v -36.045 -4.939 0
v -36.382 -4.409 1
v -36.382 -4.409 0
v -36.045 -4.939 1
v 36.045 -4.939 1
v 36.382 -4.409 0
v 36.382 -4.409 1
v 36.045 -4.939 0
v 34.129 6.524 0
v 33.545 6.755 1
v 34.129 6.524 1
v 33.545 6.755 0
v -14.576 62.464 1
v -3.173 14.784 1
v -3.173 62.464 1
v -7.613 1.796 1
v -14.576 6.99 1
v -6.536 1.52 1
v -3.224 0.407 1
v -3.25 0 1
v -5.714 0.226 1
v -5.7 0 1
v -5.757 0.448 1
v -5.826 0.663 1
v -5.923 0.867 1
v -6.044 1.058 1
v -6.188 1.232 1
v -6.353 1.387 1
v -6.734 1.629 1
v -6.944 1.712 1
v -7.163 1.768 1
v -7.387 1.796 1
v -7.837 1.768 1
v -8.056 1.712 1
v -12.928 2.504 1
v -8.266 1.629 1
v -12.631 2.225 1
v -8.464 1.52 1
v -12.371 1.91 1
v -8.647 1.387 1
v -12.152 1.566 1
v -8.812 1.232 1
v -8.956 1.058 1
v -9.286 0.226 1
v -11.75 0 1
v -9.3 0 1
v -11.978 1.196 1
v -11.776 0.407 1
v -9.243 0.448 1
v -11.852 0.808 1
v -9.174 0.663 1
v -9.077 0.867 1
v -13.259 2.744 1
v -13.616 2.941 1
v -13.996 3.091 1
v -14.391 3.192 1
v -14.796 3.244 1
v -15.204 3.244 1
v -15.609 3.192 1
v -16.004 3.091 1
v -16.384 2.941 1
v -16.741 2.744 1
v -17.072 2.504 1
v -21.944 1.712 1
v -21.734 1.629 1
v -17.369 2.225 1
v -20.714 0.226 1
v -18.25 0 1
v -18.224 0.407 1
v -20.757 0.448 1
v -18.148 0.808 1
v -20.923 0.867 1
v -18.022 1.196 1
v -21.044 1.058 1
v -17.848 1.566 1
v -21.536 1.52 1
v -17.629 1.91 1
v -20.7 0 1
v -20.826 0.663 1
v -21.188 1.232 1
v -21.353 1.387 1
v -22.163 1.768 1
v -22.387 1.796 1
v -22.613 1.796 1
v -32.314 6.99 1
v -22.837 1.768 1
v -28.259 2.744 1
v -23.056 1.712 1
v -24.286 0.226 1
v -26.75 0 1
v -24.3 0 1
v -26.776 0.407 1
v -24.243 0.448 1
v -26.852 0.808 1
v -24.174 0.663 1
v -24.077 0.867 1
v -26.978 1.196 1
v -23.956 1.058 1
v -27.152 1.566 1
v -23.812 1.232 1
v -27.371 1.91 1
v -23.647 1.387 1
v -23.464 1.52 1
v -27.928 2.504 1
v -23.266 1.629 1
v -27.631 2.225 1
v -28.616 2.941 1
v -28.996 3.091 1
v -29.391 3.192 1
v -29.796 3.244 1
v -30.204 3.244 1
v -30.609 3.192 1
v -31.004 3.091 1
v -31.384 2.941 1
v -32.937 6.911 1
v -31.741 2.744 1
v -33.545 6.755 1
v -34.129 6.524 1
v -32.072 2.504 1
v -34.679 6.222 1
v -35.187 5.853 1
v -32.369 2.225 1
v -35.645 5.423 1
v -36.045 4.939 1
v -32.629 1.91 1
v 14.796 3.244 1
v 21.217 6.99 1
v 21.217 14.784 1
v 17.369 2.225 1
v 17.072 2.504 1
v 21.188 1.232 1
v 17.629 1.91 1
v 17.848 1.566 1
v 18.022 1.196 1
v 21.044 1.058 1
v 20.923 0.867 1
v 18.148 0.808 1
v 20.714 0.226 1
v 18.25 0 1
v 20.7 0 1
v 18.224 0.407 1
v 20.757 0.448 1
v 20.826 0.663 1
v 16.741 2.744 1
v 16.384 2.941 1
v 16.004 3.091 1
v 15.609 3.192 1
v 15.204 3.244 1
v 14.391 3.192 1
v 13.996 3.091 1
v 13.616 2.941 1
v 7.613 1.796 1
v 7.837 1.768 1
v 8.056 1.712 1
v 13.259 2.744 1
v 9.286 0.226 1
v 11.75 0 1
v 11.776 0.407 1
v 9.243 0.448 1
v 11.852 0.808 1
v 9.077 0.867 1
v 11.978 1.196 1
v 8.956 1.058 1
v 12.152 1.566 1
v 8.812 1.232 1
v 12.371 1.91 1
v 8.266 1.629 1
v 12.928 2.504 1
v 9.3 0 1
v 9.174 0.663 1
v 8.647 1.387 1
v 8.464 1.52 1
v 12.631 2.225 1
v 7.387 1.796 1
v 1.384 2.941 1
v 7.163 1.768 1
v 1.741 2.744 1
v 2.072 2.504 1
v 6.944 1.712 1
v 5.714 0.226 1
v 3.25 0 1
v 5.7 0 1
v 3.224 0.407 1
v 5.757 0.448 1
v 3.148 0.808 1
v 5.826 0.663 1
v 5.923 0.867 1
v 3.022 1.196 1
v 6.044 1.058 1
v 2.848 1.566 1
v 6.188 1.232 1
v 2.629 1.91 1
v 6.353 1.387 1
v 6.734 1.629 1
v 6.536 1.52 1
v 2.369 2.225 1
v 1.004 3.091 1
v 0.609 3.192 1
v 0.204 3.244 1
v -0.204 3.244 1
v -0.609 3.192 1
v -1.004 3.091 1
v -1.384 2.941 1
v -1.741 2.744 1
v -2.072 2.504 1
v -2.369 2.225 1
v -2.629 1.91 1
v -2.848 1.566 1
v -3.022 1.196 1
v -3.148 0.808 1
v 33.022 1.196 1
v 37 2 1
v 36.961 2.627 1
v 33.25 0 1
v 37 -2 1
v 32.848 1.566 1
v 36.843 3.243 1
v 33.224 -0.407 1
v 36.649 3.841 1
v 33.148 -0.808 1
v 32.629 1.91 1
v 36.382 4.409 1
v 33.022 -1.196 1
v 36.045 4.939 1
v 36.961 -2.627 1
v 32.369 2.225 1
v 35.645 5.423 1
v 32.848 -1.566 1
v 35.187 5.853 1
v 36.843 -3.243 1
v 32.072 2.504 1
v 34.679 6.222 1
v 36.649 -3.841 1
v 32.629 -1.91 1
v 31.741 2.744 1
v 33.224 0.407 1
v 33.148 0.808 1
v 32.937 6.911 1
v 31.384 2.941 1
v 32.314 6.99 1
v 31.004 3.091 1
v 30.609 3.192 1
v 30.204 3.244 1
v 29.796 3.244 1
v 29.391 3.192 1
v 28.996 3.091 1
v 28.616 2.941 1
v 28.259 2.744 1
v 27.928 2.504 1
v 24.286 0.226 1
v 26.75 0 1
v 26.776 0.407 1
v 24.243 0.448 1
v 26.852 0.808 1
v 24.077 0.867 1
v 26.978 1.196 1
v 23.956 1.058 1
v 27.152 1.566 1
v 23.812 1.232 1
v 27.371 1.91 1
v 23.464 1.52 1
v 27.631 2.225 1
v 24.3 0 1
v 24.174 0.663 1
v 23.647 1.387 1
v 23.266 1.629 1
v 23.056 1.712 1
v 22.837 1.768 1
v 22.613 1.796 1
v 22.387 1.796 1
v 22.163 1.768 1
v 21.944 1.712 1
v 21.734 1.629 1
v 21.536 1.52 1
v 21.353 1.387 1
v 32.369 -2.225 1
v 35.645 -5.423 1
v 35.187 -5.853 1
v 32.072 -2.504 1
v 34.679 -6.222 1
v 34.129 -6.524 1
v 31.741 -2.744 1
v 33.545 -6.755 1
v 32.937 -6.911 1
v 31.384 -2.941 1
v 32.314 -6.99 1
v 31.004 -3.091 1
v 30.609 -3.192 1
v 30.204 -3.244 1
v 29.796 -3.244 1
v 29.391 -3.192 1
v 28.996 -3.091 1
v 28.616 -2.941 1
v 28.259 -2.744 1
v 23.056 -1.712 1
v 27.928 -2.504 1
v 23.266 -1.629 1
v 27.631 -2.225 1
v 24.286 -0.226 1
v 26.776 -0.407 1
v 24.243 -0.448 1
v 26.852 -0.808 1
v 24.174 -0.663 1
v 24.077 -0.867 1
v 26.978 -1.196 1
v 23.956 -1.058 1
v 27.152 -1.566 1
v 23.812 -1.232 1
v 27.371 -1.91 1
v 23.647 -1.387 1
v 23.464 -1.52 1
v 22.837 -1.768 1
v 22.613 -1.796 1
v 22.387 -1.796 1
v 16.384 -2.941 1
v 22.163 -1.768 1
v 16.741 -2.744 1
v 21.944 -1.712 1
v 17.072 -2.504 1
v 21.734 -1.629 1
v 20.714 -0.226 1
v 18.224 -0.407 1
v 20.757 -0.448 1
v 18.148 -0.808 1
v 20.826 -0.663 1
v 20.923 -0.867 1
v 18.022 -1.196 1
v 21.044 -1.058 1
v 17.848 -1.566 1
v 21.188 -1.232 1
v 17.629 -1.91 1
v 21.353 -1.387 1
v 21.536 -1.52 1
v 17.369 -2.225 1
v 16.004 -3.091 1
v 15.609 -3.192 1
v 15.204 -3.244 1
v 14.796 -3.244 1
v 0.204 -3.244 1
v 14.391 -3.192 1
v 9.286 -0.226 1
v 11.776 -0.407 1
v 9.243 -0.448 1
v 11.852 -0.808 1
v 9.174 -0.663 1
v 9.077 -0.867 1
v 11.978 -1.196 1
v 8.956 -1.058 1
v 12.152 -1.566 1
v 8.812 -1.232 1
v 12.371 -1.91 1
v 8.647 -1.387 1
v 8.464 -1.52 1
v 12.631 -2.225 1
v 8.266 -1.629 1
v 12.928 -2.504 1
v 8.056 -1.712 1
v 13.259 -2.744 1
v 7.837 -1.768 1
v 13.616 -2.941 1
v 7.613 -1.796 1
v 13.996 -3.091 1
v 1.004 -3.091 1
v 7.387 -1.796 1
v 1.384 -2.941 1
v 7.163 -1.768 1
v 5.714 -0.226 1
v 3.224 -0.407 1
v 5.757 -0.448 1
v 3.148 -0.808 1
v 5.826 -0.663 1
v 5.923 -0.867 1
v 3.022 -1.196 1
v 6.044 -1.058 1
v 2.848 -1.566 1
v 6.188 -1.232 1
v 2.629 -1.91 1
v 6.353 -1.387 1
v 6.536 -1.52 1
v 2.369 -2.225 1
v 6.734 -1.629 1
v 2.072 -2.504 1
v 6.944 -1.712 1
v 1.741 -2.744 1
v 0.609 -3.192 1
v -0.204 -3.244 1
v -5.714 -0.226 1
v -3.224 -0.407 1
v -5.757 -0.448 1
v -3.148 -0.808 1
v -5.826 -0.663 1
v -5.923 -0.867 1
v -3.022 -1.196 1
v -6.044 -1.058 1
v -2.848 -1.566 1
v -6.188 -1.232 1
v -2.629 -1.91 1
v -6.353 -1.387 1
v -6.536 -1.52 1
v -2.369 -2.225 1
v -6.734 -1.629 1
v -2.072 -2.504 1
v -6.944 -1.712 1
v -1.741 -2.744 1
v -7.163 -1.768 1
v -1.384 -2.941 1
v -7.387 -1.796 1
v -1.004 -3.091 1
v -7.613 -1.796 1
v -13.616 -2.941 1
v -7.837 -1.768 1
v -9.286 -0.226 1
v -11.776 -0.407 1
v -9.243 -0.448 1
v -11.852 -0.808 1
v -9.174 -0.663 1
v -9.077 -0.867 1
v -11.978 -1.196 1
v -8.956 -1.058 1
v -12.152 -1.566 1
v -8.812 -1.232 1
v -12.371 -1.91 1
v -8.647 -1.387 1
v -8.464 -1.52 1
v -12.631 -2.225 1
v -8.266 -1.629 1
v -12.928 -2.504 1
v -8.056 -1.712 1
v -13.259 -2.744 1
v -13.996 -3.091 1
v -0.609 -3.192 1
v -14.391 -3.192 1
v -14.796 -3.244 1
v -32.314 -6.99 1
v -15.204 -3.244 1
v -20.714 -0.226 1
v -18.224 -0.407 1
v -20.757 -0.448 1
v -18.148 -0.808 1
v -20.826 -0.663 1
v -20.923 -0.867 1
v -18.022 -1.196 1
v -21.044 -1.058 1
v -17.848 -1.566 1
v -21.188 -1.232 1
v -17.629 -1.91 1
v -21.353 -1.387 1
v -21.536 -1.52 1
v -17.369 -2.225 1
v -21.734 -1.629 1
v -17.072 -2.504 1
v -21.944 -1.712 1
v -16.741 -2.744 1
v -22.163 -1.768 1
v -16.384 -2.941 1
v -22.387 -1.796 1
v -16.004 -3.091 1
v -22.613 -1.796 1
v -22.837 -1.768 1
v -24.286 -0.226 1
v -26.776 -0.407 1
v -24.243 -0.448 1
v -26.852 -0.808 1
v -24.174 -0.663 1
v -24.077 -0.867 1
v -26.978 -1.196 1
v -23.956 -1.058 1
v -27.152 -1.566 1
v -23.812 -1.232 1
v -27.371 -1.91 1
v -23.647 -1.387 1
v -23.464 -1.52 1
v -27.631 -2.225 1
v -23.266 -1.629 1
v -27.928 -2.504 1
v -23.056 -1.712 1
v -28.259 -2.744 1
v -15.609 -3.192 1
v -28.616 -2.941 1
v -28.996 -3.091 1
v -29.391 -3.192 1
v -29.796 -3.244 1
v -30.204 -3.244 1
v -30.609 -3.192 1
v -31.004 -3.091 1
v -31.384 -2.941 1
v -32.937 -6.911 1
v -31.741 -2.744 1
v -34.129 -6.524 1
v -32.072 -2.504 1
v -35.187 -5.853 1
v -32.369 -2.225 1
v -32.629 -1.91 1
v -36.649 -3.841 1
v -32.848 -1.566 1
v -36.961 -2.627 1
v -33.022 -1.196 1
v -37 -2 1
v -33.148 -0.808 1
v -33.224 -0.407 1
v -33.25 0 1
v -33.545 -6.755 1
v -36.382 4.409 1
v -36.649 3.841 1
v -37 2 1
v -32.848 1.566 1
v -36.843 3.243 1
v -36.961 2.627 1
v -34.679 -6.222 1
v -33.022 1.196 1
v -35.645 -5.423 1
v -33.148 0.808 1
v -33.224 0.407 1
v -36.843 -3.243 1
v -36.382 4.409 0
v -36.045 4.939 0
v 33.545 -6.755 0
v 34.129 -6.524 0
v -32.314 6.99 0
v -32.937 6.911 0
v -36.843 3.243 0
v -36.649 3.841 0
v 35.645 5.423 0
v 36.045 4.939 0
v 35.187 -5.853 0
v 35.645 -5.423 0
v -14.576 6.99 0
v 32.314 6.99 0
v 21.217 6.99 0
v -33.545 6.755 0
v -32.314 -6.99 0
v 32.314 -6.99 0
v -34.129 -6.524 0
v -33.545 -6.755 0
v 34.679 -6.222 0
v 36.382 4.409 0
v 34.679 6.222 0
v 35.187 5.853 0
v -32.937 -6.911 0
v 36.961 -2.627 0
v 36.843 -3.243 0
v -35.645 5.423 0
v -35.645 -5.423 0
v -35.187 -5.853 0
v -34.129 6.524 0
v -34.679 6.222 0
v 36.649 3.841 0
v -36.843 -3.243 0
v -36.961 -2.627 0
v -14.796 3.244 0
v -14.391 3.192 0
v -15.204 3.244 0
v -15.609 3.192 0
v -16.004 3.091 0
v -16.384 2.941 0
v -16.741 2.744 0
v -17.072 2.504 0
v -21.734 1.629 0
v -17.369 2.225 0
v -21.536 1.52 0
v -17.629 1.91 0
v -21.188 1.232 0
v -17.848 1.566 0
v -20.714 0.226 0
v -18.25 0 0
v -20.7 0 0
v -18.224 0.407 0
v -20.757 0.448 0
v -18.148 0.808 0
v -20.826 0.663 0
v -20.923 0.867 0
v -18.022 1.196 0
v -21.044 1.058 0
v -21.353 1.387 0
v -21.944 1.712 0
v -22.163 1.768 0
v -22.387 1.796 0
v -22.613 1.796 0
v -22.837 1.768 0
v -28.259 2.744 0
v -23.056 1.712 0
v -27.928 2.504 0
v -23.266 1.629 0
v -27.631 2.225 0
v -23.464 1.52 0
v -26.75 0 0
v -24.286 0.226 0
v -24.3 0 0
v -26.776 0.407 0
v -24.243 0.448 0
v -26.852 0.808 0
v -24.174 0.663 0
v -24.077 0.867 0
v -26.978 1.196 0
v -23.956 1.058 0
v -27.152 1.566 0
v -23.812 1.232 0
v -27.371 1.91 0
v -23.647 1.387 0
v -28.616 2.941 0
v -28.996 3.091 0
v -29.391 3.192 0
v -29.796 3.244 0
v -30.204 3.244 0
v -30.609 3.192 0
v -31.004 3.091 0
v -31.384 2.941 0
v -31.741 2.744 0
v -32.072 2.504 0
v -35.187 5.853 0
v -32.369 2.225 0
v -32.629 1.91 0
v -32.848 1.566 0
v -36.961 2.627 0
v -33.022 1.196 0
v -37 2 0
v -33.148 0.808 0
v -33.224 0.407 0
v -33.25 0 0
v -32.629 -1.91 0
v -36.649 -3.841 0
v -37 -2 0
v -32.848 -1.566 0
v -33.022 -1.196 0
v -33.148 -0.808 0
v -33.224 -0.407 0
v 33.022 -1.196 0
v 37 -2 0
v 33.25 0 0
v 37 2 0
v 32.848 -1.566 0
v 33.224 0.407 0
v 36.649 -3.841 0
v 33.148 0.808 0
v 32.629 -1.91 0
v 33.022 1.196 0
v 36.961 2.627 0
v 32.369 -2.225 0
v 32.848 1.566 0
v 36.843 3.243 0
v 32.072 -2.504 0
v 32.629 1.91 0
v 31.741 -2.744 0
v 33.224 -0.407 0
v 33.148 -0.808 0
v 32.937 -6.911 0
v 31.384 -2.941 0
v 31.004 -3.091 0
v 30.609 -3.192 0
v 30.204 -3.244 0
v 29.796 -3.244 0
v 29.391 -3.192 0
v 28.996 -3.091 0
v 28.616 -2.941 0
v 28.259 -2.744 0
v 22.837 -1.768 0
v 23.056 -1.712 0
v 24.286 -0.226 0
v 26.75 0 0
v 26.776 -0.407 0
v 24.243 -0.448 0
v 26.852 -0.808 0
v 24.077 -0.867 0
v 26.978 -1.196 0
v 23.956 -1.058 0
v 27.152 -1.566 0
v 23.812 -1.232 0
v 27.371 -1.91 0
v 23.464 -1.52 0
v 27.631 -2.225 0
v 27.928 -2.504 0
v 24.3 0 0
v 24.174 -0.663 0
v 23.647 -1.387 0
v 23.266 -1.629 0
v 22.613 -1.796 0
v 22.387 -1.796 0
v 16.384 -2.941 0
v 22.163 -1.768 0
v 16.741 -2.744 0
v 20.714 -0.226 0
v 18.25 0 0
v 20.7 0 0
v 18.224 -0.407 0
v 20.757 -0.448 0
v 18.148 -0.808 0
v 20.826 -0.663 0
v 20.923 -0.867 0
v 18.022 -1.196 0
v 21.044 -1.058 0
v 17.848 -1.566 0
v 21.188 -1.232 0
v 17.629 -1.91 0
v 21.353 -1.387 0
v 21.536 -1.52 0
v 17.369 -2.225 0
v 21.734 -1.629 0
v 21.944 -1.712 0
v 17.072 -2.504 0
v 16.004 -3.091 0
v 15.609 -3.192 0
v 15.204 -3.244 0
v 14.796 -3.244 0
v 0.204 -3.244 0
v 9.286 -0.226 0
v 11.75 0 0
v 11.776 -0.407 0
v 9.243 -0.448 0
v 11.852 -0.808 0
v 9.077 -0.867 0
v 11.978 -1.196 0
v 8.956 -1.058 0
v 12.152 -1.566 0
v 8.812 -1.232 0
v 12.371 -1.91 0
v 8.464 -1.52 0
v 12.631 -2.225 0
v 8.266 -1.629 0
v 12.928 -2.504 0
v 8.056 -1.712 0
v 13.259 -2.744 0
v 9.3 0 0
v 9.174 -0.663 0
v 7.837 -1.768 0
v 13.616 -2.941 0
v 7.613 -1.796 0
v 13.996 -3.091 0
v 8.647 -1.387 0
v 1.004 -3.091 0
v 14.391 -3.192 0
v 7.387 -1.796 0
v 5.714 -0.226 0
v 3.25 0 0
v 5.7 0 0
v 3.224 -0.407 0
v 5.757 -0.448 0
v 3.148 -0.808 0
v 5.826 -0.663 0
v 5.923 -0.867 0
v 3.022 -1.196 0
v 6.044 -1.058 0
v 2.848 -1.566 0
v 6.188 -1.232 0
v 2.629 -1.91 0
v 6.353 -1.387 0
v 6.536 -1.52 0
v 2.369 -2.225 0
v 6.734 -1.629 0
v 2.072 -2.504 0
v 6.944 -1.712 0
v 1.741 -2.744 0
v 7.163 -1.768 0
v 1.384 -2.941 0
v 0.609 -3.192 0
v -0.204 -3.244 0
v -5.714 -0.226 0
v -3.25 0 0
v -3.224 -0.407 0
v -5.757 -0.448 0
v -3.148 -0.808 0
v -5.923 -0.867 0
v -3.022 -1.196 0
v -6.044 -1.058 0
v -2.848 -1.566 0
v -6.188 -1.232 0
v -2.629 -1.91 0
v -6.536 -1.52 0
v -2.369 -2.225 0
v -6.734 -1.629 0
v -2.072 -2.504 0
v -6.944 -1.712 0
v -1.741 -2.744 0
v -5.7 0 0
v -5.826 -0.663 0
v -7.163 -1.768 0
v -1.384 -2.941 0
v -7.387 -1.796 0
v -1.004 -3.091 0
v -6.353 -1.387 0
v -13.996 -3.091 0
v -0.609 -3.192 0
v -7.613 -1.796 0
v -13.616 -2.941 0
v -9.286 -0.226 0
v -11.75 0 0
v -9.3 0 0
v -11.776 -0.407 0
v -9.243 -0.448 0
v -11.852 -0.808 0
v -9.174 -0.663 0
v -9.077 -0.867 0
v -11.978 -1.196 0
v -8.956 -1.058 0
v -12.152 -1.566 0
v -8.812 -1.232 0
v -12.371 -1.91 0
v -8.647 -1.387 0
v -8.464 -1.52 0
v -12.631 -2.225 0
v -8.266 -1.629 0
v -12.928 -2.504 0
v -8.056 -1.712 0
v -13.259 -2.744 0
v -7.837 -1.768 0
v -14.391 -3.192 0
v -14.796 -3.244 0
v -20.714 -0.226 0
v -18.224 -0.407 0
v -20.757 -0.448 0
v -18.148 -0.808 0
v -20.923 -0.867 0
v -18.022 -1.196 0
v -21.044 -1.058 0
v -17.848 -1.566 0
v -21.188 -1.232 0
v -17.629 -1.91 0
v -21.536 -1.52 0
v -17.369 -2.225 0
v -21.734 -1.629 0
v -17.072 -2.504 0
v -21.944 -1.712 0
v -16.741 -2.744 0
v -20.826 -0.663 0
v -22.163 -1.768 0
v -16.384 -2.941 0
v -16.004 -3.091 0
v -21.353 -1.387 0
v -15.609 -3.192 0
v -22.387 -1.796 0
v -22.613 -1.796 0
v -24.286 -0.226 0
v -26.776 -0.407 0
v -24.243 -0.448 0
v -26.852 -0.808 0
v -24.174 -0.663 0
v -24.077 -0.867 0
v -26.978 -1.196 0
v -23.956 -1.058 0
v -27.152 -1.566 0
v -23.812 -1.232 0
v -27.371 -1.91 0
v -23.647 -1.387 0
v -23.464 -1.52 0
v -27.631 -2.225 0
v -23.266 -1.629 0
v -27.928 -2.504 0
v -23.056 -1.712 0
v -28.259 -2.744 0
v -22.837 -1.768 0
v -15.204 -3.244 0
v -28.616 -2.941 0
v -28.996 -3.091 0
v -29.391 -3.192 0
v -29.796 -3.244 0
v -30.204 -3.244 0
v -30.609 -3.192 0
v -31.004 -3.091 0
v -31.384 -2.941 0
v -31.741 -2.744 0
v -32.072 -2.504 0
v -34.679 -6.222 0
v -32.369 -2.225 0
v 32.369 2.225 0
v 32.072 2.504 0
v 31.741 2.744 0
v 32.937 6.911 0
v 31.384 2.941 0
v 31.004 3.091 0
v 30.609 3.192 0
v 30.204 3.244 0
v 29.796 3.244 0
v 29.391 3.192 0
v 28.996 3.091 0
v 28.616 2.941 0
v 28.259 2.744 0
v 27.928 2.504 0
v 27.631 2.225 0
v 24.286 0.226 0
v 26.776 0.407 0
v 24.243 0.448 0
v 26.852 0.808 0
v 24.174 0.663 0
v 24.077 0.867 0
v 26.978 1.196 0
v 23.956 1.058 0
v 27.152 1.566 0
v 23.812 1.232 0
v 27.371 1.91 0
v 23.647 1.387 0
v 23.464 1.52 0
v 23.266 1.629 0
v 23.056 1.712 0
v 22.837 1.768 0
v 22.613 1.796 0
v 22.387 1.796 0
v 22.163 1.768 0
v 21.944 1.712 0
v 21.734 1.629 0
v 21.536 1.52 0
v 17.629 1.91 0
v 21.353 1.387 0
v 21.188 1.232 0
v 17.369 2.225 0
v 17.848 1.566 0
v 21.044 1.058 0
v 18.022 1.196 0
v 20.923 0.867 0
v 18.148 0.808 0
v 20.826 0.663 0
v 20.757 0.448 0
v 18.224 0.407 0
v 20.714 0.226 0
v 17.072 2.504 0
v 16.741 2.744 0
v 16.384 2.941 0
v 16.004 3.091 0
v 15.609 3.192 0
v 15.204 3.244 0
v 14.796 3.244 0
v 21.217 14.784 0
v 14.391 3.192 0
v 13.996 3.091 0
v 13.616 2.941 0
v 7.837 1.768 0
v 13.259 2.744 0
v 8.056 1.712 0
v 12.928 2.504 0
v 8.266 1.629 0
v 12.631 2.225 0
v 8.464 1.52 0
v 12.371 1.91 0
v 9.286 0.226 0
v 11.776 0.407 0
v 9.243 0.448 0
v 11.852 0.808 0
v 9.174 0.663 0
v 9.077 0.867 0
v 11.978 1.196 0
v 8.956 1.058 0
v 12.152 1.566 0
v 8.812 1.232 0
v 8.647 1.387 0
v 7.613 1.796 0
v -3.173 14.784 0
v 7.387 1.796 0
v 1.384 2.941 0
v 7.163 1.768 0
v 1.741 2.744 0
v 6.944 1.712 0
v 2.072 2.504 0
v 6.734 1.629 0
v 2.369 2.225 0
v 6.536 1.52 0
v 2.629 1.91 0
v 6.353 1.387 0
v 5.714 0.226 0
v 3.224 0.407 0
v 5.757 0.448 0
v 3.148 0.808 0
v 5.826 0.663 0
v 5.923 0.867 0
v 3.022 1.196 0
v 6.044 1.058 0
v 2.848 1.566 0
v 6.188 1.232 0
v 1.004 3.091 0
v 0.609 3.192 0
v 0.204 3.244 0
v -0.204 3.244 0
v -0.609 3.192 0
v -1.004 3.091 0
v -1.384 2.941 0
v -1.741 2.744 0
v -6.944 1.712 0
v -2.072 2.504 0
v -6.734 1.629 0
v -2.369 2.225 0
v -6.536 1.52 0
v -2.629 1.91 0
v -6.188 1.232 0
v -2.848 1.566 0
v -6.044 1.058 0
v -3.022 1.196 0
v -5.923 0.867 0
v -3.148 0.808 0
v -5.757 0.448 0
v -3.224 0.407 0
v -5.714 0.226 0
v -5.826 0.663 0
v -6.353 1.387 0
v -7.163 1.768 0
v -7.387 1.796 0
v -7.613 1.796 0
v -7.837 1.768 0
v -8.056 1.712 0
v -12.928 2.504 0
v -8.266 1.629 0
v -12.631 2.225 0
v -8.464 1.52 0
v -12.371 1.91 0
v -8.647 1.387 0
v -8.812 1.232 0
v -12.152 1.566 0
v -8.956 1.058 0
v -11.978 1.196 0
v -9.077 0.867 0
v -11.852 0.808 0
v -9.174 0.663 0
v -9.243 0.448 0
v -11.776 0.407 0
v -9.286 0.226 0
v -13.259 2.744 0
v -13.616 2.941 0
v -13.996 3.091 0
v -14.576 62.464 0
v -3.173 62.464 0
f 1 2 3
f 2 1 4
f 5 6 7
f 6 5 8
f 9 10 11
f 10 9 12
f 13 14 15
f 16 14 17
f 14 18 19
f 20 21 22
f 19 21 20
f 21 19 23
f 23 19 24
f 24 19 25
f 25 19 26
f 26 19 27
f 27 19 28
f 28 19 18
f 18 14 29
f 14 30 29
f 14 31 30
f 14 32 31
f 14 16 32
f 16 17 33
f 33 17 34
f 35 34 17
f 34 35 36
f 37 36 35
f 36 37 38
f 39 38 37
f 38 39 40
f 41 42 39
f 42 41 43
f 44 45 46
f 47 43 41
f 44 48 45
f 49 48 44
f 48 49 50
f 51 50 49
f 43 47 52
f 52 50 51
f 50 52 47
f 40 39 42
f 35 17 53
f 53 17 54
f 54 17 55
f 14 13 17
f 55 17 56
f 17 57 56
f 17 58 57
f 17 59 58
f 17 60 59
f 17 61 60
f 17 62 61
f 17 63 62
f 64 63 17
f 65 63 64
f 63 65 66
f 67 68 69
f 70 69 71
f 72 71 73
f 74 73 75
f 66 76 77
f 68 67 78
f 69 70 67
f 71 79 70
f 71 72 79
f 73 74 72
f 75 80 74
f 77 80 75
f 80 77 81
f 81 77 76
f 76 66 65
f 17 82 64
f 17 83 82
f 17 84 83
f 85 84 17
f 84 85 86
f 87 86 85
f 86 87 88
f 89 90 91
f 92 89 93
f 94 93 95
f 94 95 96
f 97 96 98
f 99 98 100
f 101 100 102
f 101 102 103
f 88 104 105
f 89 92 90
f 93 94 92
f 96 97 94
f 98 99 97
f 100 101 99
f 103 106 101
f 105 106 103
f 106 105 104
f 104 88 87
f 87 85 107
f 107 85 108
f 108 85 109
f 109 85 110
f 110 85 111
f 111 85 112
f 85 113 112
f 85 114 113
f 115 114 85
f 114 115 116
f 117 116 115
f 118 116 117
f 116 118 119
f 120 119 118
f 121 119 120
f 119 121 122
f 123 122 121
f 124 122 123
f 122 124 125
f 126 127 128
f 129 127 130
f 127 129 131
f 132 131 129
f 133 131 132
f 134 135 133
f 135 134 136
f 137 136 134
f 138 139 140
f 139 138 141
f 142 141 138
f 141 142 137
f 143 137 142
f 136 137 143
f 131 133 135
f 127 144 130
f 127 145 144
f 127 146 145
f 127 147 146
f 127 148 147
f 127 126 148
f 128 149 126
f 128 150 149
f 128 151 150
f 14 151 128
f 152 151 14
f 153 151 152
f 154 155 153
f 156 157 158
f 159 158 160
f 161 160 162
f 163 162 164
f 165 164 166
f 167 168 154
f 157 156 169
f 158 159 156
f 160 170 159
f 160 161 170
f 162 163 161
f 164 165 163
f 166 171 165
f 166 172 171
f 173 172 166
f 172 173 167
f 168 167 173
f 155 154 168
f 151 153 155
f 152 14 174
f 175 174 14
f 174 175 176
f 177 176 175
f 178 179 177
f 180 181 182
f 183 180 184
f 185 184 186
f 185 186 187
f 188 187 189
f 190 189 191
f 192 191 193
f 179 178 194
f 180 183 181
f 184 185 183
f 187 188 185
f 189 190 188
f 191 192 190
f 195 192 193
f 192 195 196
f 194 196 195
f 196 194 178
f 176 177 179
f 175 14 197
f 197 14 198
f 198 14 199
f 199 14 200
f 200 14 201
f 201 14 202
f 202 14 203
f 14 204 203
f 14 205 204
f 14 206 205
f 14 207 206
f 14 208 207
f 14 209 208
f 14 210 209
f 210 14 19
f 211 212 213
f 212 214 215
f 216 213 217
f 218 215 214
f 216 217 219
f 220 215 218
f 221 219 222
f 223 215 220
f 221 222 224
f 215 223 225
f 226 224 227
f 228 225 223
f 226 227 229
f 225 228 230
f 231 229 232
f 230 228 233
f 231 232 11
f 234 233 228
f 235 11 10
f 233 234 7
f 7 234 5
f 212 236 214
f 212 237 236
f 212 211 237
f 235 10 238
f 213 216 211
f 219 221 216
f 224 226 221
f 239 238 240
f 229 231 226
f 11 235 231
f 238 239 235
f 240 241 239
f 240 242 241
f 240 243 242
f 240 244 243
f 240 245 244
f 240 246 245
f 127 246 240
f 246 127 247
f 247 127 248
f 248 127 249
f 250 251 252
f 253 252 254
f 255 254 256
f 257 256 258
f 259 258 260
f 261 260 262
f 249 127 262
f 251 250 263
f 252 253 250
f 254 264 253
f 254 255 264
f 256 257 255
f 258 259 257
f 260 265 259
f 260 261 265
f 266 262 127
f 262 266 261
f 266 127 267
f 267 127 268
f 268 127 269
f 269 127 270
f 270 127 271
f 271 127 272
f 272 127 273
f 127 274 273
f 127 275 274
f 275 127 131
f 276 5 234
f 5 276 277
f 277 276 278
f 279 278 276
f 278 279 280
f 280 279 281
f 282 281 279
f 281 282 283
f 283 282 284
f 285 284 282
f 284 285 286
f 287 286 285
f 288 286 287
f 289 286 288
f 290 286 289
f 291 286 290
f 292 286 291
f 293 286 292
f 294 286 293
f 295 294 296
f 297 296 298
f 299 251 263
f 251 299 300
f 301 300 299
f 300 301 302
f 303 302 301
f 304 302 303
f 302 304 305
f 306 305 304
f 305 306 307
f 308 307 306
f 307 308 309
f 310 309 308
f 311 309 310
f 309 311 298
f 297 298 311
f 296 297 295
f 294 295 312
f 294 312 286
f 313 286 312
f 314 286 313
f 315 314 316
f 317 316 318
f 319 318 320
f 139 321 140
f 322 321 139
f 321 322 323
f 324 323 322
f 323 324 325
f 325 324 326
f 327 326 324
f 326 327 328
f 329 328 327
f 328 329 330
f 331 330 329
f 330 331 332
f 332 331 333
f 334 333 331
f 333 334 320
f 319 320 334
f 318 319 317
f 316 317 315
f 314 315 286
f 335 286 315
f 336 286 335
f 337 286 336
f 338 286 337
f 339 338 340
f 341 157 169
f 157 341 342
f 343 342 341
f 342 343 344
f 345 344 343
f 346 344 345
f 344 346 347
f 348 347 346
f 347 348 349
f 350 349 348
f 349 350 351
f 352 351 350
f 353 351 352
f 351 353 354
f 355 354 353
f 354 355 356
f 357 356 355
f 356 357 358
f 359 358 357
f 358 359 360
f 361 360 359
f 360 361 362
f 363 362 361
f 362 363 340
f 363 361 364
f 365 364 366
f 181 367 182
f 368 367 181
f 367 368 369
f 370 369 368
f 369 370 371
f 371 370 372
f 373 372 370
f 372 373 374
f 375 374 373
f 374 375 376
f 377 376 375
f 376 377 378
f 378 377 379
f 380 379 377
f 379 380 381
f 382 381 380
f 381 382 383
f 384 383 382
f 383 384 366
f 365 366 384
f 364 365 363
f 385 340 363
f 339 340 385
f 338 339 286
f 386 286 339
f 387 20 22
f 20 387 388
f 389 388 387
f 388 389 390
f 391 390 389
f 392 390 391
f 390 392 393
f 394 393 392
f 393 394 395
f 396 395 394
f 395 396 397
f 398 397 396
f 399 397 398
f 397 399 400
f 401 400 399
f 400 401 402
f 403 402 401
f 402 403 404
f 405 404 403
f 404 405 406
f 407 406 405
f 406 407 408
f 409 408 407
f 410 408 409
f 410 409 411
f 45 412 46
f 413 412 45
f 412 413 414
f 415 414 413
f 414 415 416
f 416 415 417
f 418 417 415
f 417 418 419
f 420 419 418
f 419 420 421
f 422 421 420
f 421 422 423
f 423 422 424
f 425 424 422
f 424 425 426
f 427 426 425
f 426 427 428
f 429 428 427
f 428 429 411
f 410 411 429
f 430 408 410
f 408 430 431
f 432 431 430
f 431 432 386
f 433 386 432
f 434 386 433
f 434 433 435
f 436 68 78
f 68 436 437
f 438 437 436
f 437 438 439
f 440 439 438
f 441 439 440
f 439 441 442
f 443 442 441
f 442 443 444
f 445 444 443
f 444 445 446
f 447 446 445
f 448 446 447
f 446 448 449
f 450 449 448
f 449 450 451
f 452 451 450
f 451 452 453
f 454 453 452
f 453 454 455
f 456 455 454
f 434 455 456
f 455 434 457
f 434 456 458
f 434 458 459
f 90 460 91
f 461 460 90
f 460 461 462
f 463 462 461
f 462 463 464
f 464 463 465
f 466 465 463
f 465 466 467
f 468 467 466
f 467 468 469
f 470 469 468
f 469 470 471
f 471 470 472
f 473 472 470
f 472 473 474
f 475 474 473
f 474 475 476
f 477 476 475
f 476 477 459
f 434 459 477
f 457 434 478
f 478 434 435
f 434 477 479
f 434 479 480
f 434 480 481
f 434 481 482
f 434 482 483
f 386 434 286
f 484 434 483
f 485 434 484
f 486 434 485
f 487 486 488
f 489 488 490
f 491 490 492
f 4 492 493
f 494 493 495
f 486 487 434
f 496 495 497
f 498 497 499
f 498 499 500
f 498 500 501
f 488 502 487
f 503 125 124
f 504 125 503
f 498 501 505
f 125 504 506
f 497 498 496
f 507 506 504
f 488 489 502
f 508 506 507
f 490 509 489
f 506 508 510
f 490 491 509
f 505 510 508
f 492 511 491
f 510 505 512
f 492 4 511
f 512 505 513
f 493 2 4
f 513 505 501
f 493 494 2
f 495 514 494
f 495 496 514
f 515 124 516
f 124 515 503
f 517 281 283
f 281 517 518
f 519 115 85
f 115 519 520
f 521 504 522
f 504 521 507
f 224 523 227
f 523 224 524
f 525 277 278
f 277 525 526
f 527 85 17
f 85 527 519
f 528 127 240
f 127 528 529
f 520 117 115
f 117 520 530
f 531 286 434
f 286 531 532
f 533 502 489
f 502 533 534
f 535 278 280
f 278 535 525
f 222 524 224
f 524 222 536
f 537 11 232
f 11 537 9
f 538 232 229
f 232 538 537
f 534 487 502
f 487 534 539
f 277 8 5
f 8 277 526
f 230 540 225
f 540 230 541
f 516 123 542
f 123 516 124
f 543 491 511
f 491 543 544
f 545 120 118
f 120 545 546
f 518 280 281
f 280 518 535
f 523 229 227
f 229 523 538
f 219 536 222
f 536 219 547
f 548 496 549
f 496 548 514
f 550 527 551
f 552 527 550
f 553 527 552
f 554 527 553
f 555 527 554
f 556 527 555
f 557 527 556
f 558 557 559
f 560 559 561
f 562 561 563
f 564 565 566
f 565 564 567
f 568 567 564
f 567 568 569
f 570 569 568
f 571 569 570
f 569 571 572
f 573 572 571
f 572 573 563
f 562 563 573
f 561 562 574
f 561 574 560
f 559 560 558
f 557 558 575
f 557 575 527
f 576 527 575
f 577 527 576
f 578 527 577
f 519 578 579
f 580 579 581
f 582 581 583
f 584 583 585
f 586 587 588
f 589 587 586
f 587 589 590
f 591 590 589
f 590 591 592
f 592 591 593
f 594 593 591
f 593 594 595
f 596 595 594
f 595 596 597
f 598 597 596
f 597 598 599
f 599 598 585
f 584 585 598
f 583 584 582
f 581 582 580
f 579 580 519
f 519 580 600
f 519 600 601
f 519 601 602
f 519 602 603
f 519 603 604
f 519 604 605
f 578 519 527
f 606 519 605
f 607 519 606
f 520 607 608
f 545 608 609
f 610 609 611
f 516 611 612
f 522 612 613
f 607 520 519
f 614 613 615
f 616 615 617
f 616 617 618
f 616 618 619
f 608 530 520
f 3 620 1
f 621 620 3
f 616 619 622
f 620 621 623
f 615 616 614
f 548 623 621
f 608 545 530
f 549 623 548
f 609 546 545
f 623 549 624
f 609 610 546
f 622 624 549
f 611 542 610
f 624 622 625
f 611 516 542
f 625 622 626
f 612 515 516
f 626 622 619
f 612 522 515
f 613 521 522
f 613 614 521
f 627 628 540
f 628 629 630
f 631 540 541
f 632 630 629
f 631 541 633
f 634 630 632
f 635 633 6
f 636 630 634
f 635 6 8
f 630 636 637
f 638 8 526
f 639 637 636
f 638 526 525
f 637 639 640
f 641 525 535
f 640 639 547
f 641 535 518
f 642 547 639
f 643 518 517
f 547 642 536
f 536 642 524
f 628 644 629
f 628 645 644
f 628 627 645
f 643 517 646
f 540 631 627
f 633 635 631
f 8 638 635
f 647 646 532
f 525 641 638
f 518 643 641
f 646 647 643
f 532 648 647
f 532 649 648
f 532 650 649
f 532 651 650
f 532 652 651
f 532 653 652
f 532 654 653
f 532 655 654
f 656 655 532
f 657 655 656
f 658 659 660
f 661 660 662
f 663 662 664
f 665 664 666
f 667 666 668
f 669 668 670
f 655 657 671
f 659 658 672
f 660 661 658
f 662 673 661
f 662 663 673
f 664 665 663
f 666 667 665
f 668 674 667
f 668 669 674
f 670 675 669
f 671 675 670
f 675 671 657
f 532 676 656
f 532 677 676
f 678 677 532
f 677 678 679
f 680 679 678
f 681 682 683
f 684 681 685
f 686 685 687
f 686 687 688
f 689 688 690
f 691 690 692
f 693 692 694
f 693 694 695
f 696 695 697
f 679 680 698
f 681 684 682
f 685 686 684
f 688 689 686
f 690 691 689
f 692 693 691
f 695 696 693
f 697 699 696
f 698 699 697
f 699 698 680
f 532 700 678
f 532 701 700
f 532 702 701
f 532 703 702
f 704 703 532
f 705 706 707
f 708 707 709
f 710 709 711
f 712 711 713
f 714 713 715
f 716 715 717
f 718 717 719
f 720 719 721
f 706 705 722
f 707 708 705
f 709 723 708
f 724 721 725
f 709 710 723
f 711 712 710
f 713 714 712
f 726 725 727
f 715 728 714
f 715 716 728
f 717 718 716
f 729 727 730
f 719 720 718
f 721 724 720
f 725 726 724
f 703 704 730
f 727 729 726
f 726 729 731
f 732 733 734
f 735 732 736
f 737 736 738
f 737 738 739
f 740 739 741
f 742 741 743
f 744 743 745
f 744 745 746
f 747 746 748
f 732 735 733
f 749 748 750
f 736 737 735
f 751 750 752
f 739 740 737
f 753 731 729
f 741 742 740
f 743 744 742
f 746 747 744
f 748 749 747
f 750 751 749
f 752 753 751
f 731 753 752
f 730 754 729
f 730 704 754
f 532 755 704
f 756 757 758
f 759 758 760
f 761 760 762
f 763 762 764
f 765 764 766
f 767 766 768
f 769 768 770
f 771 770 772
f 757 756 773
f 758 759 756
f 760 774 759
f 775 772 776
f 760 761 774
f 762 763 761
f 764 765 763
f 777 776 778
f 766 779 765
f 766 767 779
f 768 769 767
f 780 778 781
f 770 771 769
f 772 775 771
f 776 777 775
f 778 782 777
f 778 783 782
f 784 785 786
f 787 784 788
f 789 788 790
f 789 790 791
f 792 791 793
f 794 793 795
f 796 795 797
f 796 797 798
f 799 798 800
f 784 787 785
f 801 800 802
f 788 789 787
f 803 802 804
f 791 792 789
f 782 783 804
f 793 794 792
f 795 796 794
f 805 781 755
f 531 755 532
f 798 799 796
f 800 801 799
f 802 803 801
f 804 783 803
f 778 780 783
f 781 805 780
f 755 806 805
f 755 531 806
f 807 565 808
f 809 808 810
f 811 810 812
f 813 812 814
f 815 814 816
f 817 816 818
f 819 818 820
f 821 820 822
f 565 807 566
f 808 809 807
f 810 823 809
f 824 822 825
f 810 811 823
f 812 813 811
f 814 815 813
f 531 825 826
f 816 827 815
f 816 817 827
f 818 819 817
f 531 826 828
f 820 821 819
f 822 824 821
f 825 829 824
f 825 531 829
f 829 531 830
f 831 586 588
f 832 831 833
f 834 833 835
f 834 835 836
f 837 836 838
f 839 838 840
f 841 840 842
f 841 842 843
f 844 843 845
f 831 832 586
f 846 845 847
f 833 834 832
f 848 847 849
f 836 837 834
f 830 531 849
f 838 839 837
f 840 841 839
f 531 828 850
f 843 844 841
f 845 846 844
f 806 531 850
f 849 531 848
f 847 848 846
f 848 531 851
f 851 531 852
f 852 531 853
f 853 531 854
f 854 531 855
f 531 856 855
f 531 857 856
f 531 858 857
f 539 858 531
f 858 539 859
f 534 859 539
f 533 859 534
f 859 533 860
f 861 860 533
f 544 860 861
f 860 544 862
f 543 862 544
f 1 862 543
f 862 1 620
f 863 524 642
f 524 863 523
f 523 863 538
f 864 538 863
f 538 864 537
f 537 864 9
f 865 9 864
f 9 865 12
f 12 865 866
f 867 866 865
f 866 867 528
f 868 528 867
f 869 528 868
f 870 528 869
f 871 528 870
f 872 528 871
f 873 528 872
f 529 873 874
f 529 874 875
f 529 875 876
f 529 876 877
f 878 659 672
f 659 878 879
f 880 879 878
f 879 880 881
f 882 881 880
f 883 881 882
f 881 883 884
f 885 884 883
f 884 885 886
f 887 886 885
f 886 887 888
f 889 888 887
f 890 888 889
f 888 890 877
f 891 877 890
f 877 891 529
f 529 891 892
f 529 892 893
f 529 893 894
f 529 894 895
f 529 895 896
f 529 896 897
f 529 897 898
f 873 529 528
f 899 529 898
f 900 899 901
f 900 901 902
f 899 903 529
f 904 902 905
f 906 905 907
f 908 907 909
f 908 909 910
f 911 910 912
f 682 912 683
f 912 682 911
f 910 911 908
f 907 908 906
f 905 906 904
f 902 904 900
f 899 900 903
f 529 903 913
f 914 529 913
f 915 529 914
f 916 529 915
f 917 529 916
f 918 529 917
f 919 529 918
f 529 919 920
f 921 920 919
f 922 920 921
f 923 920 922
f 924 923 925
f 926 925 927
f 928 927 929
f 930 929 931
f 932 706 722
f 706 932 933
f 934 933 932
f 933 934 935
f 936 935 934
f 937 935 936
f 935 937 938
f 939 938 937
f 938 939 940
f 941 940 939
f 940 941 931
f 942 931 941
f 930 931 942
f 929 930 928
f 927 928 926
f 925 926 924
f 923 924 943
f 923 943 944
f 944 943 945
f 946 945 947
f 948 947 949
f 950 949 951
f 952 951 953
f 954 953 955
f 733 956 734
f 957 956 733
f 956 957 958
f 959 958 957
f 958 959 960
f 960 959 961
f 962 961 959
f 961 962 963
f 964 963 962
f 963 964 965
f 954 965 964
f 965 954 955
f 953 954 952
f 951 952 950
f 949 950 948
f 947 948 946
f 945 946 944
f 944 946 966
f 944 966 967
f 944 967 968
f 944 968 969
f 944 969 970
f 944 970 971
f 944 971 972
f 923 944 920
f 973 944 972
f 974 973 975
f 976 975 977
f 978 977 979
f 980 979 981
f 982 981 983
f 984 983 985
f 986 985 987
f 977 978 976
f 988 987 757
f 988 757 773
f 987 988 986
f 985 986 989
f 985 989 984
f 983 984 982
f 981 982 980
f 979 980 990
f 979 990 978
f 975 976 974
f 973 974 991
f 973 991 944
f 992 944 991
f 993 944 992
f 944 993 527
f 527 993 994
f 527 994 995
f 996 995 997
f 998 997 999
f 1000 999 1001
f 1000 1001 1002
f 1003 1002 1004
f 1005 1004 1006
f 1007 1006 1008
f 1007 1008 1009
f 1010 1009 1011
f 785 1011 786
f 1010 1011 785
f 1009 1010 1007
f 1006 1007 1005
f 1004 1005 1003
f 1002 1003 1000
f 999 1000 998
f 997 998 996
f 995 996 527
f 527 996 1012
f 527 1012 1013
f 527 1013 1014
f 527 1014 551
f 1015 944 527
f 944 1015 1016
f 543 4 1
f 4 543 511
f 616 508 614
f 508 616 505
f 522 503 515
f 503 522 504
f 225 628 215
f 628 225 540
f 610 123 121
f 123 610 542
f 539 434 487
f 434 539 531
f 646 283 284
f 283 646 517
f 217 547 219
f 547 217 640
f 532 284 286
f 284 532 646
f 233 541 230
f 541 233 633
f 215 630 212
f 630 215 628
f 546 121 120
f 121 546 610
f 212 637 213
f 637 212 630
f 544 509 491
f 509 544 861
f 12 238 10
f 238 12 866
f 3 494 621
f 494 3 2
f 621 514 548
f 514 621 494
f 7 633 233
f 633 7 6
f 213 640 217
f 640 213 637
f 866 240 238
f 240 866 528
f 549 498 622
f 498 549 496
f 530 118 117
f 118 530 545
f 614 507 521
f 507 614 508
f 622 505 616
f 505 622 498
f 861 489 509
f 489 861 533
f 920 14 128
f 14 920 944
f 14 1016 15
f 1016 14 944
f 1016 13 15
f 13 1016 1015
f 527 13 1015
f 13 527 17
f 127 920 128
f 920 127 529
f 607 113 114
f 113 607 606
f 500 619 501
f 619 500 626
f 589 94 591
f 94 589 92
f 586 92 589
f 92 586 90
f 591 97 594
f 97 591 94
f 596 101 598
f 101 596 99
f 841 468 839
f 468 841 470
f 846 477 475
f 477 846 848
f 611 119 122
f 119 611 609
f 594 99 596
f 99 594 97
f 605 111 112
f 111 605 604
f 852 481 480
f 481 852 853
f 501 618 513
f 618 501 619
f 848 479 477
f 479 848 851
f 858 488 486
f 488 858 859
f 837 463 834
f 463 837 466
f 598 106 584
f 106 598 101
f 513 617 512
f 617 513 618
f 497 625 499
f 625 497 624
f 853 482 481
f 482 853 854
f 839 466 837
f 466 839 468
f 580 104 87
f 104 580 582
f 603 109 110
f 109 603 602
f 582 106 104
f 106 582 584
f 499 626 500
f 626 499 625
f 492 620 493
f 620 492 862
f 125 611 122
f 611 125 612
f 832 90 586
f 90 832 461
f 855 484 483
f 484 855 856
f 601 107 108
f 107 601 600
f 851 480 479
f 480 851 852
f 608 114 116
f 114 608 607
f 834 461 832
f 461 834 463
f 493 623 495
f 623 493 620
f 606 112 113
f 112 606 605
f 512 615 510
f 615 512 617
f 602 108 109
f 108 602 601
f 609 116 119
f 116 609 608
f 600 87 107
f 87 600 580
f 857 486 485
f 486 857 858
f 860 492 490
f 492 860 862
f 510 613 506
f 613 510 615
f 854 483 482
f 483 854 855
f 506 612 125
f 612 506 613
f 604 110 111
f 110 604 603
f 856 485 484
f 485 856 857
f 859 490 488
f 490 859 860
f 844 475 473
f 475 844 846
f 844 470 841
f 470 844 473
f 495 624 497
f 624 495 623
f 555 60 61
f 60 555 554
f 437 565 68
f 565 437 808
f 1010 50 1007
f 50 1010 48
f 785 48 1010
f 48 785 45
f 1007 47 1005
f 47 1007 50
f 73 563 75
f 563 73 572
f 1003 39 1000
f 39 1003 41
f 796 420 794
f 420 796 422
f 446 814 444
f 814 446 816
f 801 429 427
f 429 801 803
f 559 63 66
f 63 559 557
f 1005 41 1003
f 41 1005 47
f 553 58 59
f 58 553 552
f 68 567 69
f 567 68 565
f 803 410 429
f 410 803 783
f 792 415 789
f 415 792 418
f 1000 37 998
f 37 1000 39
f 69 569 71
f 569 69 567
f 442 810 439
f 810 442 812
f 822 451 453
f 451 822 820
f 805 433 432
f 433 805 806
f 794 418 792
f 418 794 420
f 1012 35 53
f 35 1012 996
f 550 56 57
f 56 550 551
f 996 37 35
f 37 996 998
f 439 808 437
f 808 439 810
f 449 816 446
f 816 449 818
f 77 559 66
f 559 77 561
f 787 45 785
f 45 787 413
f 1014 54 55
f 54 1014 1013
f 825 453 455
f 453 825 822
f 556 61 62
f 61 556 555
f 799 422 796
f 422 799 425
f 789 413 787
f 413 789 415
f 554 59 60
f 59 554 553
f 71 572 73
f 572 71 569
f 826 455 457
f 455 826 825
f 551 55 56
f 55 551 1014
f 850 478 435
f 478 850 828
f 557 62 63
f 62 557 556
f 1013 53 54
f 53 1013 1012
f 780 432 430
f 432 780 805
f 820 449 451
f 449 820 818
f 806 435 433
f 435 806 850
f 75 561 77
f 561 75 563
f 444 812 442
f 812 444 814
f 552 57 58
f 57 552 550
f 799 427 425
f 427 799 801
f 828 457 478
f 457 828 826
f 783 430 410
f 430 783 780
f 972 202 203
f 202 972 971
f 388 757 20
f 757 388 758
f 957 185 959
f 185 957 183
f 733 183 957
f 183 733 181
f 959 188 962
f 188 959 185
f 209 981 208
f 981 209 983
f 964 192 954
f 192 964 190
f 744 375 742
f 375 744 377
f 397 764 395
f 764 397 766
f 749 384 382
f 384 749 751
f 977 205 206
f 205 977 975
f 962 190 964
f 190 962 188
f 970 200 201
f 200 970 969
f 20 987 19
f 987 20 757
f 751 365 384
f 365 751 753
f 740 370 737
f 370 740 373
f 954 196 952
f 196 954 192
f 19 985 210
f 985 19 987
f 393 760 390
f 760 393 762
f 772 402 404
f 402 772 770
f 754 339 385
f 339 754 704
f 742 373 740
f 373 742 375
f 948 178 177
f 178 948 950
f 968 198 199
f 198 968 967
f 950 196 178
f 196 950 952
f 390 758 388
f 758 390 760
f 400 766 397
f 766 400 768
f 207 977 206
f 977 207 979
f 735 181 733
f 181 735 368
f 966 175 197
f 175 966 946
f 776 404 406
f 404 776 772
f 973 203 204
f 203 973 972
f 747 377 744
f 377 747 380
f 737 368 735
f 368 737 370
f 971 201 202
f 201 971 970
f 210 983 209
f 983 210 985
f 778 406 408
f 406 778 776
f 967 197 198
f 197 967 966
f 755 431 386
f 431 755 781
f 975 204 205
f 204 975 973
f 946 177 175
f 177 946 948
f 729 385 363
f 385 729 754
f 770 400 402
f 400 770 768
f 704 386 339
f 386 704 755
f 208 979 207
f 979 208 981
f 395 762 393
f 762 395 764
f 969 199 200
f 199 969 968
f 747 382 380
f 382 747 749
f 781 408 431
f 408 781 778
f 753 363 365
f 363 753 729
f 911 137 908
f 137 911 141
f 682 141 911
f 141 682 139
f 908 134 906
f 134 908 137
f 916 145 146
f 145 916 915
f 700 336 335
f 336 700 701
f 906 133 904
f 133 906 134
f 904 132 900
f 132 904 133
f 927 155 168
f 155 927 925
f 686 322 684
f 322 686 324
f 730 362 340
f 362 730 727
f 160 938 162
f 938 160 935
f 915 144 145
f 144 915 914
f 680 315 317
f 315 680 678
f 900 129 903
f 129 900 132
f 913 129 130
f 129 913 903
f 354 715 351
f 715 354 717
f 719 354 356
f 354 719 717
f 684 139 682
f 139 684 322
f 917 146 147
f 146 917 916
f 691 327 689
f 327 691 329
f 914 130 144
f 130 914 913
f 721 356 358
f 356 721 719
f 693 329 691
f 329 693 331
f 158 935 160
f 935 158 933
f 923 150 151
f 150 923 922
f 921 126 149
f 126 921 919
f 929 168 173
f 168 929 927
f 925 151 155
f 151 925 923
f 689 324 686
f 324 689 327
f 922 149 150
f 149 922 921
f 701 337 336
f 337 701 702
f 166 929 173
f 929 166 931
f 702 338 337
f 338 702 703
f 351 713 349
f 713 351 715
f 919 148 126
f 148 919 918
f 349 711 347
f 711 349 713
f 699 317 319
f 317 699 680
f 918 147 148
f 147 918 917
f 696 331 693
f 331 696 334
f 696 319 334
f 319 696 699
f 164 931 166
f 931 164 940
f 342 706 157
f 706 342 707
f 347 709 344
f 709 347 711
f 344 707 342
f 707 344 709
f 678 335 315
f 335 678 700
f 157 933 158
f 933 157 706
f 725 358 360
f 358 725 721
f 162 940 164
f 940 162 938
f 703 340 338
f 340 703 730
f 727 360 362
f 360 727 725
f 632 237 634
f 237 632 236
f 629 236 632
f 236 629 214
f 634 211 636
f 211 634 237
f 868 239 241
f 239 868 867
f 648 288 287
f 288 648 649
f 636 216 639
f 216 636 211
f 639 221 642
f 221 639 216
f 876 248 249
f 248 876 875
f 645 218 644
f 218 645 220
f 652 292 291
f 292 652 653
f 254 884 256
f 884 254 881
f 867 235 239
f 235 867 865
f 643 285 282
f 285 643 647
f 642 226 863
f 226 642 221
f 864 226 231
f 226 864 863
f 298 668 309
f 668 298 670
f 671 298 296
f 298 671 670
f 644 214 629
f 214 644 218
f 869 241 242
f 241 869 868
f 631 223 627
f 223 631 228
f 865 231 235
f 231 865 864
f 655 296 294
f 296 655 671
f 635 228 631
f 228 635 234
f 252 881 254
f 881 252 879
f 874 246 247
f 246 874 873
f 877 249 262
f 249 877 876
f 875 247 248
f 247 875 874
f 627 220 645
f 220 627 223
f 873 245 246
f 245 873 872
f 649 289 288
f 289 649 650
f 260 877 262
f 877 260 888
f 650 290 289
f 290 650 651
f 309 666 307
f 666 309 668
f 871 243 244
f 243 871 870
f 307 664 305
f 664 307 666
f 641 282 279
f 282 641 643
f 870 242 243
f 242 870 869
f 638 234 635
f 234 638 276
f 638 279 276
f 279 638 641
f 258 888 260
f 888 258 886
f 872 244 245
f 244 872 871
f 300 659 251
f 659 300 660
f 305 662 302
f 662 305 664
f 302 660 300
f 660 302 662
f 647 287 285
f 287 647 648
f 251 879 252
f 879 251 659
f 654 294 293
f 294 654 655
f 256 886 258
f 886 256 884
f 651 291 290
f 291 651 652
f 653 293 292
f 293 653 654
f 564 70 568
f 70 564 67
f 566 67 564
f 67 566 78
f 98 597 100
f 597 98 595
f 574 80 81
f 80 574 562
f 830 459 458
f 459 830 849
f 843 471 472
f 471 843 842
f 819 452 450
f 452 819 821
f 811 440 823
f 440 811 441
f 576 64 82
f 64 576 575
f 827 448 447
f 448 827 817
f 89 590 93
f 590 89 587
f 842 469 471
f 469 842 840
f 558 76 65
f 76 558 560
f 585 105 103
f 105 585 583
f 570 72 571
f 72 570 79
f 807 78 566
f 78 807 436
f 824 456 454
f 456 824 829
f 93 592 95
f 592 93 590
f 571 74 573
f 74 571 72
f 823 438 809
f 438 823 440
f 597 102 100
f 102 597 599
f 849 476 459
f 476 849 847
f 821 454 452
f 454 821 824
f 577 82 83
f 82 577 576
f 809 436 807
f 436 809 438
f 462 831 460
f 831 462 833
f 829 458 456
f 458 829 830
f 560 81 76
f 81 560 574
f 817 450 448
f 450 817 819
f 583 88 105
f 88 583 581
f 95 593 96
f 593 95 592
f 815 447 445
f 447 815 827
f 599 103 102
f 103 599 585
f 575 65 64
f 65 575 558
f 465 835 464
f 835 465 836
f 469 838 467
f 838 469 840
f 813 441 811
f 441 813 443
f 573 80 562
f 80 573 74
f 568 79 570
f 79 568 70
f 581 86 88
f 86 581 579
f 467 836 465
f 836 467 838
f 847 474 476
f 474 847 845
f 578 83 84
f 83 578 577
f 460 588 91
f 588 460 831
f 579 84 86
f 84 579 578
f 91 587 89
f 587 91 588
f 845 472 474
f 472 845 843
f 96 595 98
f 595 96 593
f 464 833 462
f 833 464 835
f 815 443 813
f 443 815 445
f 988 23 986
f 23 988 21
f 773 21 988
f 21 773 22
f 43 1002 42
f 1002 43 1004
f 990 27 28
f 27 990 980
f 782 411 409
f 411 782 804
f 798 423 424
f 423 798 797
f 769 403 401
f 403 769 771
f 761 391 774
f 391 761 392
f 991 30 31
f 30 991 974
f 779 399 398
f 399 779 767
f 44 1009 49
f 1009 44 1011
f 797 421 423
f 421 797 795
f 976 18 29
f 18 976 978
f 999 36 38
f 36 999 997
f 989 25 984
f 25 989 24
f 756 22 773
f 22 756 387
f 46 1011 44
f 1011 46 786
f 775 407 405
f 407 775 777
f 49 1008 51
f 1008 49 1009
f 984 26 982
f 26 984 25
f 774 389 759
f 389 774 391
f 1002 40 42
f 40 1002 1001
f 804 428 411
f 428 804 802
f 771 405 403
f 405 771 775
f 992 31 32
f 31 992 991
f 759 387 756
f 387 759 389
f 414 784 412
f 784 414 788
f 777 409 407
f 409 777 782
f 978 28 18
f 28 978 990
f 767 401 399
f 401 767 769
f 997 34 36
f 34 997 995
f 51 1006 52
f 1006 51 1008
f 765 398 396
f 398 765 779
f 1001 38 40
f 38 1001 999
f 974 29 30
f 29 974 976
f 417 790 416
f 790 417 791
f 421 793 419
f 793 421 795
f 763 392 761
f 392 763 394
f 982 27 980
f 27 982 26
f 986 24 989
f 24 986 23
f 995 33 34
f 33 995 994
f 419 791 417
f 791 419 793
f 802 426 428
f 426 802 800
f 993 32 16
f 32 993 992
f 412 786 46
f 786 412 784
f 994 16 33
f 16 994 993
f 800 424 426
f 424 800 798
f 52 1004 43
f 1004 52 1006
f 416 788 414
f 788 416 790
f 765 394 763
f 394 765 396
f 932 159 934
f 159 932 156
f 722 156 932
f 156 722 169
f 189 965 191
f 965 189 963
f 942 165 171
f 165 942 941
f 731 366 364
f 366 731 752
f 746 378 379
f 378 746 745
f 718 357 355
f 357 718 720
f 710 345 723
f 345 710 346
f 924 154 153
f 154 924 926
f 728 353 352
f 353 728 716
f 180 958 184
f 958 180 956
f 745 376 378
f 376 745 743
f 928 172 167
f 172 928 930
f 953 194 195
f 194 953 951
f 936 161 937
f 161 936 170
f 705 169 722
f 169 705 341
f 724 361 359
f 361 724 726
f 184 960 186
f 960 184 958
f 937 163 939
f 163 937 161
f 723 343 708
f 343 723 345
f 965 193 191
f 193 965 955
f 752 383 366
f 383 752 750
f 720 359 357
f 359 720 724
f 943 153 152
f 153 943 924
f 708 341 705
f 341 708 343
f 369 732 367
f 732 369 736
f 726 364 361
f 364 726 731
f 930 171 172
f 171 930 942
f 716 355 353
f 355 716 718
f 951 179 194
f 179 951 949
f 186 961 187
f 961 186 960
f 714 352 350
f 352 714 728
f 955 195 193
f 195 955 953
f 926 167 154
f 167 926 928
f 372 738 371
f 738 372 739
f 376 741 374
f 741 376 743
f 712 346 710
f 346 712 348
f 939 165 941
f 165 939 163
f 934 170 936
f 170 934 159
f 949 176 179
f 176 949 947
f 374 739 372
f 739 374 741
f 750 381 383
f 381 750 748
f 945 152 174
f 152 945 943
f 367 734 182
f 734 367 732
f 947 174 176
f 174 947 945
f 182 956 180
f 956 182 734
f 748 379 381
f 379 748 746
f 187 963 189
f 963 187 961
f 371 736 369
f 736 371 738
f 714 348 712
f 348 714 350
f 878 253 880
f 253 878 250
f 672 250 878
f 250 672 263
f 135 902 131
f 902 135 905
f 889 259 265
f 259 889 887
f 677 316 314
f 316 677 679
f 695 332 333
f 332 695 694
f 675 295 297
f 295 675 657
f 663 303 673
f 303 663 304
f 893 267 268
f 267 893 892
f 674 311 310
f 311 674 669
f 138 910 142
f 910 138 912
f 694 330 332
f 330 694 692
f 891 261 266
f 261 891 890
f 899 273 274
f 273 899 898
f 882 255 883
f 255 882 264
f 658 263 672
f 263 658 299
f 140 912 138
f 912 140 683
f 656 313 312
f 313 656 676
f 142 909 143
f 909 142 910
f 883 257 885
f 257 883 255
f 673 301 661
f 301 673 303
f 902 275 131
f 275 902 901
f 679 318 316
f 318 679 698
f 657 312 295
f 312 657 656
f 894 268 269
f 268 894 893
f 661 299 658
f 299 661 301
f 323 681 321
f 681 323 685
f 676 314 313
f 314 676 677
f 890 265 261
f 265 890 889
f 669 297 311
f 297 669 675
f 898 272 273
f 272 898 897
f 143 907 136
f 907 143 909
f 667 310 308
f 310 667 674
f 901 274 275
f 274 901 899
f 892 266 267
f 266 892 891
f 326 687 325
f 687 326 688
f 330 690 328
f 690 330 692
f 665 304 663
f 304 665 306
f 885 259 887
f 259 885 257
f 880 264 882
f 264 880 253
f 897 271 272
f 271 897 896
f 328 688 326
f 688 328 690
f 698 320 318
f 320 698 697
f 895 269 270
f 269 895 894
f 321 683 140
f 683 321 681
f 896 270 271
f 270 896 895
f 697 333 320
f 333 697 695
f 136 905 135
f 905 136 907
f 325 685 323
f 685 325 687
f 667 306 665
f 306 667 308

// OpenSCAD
$fn = 50;


difference() {
	union() {
		hull() {
			translate(v = [-32.0000000000, 2.0000000000, 0]) {
				cylinder(h = 1, r = 5);
			}
			translate(v = [32.0000000000, 2.0000000000, 0]) {
				cylinder(h = 1, r = 5);
			}
			translate(v = [-32.0000000000, -2.0000000000, 0]) {
				cylinder(h = 1, r = 5);
			}
			translate(v = [32.0000000000, -2.0000000000, 0]) {
				cylinder(h = 1, r = 5);
			}
		}
		translate(v = [0, 61.1111111111, 0]) {
			linear_extrude(height = 1) {
				text(font = "DejaVu Sans Mono:style=Bold", halign = "center", size = 57.0000000000, text = "L", valign = "top");
			}
		}
	}
	union() {
		translate(v = [-30.0000000000, 0.0000000000, 0]) {
			translate(v = [0, 0, -100]) {
				cylinder(h = 200, r = 3.2500000000);
			}
		}
		translate(v = [-15.0000000000, 0.0000000000, 0]) {
			translate(v = [0, 0, -100]) {
				cylinder(h = 200, r = 3.2500000000);
			}
		}
		translate(v = [0, 0, -100]) {
			cylinder(h = 200, r = 3.2500000000);
		}
		translate(v = [15.0000000000, 0.0000000000, 0]) {
			translate(v = [0, 0, -100]) {
				cylinder(h = 200, r = 3.2500000000);
			}
		}
		translate(v = [30.0000000000, 0.0000000000, 0]) {
			translate(v = [0, 0, -100]) {
				cylinder(h = 200, r = 3.2500000000);
			}
		}
		translate(v = [-30.0000000000, 0.0000000000, 0]) {
			translate(v = [0, 0, -100]) {
				cylinder(h = 200, r = 1.8000000000);
			}
		}
		translate(v = [-22.5000000000, 0.0000000000, 0]) {
			translate(v = [0, 0, -100]) {
				cylinder(h = 200, r = 1.8000000000);
			}
		}
		translate(v = [-15.0000000000, 0.0000000000, 0]) {
			translate(v = [0, 0, -100]) {
				cylinder(h = 200, r = 1.8000000000);
			}
		}
		translate(v = [-7.5000000000, 0.0000000000, 0]) {
			translate(v = [0, 0, -100]) {
				cylinder(h = 200, r = 1.8000000000);
			}
		}
		translate(v = [0, 0, -100]) {
			cylinder(h = 200, r = 1.8000000000);
		}
		translate(v = [7.5000000000, 0.0000000000, 0]) {
			translate(v = [0, 0, -100]) {
				cylinder(h = 200, r = 1.8000000000);
			}
		}
		translate(v = [15.0000000000, 0.0000000000, 0]) {
			translate(v = [0, 0, -100]) {
				cylinder(h = 200, r = 1.8000000000);
			}
		}
		translate(v = [22.5000000000, 0.0000000000, 0]) {
			translate(v = [0, 0, -100]) {
				cylinder(h = 200, r = 1.8000000000);
			}
		}
		translate(v = [30.0000000000, 0.0000000000, 0]) {
			translate(v = [0, 0, -100]) {
				cylinder(h = 200, r = 1.8000000000);
			}
		}
	}
}
